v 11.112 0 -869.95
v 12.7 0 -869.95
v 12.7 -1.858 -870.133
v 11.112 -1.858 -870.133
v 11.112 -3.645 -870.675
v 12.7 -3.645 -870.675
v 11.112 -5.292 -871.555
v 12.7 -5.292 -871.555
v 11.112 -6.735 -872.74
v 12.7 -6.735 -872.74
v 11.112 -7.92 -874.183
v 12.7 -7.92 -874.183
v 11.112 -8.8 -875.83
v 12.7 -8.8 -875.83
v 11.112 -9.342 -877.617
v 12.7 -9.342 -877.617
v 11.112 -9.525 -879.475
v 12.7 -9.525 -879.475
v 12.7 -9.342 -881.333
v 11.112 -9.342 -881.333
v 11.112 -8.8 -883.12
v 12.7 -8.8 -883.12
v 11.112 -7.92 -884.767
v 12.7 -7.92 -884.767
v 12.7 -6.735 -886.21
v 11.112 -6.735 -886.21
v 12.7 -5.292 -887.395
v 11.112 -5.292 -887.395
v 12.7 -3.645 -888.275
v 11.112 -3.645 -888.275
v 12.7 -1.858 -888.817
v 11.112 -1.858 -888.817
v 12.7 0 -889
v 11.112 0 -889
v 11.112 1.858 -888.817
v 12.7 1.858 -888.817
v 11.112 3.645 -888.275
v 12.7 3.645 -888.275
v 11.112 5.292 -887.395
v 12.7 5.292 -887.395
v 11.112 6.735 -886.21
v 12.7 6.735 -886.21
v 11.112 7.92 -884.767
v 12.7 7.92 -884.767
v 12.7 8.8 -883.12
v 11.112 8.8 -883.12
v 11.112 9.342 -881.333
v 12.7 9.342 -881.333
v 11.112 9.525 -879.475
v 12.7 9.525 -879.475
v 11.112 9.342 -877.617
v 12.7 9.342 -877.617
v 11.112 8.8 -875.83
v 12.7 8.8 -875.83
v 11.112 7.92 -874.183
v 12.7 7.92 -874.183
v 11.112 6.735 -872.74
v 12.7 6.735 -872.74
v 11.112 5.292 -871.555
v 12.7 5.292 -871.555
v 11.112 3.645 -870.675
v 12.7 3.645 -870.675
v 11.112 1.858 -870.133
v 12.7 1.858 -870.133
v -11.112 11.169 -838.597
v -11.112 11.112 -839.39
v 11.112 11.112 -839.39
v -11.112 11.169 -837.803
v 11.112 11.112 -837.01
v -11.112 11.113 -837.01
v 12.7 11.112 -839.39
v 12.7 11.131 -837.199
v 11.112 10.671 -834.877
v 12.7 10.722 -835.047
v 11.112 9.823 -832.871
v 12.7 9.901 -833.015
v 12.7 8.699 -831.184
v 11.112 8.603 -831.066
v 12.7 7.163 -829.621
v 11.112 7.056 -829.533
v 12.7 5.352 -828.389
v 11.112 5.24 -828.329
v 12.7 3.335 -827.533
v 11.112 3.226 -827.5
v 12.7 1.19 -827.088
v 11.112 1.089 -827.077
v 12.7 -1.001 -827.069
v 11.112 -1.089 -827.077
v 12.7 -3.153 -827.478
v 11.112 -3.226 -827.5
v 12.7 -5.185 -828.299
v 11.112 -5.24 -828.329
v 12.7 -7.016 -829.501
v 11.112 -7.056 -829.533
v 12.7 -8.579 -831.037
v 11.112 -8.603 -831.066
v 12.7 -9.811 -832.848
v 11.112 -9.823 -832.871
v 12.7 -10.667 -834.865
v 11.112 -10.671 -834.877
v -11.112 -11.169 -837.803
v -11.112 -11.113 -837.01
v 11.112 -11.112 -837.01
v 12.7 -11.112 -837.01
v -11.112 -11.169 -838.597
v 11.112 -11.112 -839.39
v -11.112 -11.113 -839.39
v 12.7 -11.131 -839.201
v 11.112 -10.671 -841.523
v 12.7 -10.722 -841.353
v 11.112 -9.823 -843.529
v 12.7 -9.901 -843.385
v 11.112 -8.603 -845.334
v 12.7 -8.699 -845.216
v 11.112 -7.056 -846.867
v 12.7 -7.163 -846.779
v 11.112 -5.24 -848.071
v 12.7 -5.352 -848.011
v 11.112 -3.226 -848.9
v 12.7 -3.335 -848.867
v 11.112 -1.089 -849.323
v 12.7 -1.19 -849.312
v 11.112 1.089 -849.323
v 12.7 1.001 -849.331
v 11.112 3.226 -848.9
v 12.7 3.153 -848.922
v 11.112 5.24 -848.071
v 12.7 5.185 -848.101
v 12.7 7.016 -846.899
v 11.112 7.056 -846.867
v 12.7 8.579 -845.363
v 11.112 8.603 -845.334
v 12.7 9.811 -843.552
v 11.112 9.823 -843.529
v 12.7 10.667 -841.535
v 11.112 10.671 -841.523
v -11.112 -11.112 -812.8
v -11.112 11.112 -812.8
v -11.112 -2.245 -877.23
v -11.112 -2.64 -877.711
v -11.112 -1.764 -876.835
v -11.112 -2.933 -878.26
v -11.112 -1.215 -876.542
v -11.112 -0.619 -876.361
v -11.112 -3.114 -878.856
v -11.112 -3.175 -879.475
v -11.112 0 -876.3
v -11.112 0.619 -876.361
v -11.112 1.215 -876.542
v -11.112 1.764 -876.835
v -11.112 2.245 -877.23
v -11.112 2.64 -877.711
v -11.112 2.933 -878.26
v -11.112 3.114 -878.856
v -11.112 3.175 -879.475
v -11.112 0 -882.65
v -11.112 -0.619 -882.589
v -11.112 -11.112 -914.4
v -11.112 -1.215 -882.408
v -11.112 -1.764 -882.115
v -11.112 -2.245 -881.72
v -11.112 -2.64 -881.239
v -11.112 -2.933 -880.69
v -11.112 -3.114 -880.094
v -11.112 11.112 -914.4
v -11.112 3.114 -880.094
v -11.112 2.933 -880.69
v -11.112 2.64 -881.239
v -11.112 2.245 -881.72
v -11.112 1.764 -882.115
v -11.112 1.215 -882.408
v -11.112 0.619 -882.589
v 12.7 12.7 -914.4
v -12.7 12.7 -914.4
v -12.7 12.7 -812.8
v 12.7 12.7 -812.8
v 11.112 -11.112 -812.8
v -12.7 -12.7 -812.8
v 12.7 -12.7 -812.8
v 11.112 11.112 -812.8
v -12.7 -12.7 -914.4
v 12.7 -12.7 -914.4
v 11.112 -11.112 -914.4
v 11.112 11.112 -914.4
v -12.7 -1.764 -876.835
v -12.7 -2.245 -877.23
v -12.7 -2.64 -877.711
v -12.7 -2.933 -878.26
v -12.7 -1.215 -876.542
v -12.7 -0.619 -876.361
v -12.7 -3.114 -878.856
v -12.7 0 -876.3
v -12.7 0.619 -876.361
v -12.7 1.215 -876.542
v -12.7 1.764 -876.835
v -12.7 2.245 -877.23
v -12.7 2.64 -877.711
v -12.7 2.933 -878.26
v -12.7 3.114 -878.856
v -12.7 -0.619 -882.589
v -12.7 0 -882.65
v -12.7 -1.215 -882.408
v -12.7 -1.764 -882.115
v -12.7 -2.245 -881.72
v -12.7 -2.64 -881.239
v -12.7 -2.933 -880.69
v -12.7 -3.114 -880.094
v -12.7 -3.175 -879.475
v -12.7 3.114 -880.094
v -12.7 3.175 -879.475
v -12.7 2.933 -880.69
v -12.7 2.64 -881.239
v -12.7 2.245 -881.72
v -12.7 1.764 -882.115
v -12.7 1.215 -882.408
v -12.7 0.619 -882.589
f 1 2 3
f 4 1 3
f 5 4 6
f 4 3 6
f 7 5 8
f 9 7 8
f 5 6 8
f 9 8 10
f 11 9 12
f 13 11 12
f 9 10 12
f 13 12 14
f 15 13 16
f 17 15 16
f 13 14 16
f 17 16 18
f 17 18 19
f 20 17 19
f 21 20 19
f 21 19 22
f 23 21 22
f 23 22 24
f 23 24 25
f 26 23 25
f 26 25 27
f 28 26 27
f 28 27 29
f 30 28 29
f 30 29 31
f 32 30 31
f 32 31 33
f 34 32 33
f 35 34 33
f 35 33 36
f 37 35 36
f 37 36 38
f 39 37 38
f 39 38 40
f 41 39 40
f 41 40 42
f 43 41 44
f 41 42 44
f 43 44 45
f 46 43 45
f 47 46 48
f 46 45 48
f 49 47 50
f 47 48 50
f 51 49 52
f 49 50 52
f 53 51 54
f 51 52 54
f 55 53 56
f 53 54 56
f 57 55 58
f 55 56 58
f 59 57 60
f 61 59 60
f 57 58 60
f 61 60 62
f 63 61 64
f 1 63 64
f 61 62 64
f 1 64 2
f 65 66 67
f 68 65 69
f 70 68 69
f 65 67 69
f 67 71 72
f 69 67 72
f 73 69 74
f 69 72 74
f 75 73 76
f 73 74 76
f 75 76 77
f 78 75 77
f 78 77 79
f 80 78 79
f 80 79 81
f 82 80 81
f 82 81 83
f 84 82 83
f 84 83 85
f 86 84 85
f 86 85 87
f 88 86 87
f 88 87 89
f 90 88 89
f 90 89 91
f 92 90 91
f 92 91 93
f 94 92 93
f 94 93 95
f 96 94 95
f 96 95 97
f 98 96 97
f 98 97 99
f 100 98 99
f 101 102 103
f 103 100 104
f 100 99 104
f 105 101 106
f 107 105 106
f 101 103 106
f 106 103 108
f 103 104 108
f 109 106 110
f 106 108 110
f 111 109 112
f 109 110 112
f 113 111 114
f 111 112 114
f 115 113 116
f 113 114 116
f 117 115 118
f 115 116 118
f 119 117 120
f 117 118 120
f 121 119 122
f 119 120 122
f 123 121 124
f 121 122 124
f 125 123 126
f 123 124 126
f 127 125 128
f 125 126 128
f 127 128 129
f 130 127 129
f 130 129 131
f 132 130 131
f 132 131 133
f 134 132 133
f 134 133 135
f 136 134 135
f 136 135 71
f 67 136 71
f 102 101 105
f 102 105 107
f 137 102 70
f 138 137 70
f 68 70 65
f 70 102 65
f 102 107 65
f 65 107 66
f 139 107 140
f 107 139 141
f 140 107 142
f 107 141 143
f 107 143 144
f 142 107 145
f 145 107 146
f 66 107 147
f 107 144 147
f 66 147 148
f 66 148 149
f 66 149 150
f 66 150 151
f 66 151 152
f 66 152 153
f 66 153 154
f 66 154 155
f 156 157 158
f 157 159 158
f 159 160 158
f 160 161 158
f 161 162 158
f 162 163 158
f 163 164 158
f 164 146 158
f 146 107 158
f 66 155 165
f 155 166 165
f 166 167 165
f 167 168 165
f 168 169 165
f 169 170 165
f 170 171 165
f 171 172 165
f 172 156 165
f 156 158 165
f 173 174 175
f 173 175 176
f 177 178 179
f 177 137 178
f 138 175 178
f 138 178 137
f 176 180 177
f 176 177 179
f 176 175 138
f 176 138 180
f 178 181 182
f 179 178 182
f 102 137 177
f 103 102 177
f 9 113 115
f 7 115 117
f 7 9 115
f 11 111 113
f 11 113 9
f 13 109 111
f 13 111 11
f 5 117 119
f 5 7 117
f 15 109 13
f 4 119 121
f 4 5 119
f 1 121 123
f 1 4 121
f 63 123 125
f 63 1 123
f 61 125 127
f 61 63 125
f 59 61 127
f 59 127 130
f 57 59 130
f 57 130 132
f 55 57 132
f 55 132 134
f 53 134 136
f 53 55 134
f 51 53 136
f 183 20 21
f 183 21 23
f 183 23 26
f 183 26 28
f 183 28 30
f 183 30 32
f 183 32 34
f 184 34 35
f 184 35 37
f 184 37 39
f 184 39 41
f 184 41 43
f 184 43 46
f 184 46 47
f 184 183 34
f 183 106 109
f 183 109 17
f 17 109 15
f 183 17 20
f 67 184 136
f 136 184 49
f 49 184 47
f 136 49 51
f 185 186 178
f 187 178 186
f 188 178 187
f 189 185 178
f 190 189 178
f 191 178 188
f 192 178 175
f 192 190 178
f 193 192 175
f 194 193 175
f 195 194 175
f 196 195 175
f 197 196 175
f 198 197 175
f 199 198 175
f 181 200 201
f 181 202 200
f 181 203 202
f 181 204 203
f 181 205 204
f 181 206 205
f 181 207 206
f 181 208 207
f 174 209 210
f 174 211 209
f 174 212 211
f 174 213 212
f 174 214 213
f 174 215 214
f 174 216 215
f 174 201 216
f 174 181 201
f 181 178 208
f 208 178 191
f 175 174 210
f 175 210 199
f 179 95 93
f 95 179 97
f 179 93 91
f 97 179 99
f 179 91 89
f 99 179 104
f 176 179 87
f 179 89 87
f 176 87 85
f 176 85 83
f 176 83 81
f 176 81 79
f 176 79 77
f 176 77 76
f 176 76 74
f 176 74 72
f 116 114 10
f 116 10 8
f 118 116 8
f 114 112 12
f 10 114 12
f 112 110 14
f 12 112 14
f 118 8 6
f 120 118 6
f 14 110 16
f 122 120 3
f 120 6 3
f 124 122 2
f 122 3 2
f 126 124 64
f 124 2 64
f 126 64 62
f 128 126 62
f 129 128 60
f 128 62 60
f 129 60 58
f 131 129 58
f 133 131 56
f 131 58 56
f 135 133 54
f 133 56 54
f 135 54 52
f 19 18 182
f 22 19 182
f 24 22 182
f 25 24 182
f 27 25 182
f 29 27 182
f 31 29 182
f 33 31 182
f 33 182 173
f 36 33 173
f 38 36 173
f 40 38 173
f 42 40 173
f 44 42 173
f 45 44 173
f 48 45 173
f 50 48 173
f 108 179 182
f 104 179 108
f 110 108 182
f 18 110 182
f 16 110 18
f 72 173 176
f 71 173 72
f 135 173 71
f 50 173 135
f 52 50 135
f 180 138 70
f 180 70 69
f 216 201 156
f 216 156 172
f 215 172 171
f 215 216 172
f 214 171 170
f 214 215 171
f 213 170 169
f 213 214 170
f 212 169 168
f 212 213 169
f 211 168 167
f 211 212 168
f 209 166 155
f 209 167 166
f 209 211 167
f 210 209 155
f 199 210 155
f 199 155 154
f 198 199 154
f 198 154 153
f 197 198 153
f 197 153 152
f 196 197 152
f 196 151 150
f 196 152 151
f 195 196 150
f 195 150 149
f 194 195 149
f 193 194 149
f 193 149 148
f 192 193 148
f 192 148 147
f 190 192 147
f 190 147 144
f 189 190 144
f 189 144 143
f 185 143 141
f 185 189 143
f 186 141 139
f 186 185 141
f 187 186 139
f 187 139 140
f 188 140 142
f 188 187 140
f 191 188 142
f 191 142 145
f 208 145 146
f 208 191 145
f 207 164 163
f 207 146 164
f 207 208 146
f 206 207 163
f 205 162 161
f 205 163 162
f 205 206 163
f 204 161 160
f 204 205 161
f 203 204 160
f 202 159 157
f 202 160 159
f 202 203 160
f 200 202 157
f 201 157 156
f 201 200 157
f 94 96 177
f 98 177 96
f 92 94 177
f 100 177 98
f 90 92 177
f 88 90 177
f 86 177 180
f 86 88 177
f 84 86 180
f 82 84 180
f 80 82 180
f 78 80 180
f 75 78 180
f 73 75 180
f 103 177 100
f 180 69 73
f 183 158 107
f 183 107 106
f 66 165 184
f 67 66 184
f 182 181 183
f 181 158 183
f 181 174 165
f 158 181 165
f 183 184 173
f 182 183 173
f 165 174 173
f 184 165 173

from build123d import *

# Parameters (mm, degrees)
BOSS_EXTRUDE1_DEPTH            = 914.4
BOSS_EXTRUDE1_DEPTH_BACK       = 914.4
SKETCH3_W                      = 25.4
SKETCH3_H                      = 25.4
SKETCH3_W_2                    = 22.225
SKETCH3_H_2                    = 22.225
SKETCH5_W                      = 58.75494954
SKETCH5_H                      = 44.648037504
CUT_EXTRUDE1_DEPTH             = 1727.2
CUT_EXTRUDE2_REACH             = 916.841
SKETCH6_R                      = 9.525
SKETCH6_R_2                    = 11.176
CUT_EXTRUDE2_DIRECTION_2_DEPTH = 915.840865943
CUT_EXTRUDE3_DEPTH             = 915.798166349
CUT_EXTRUDE3_DEPTH_BACK        = 915.798166349
SKETCH9_R                      = 3.175


with BuildPart() as part:
    # Sketch3 → Boss-Extrude1 (new, two sides: drawn at the far end of the back side and taken through both)
    with BuildSketch(Plane.XY.offset(-BOSS_EXTRUDE1_DEPTH_BACK)):
        Rectangle(SKETCH3_W, SKETCH3_H)
        Rectangle(SKETCH3_W_2, SKETCH3_H_2, mode=Mode.SUBTRACT)
    extrude(amount=BOSS_EXTRUDE1_DEPTH + BOSS_EXTRUDE1_DEPTH_BACK)

    # Sketch5 → Cut-Extrude1 (cut)
    with BuildSketch(Plane.XY.offset(914.4)):
        Rectangle(SKETCH5_W, SKETCH5_H)
    extrude(amount=-CUT_EXTRUDE1_DEPTH, mode=Mode.SUBTRACT)

    # Cut-Extrude2: up to this face of the body (flat: up to its plane)
    cut_extrude2_end = Plane(part.part.faces().sort_by_distance((-11.1125, 0, -863.6))[0])
    # Sketch6 → Cut-Extrude2 (cut, up to the picked face)
    with BuildSketch(Plane(origin=(12.7, 0, 0), x_dir=(0, 0, -1), z_dir=(1, 0, 0)), mode=Mode.PRIVATE) as cut_extrude2_sk1:
        with Locations(Location((879.475, 0, 0), (0, 0, 180))):
            Circle(SKETCH6_R)
    cut_extrude2_tool1 = split(extrude(cut_extrude2_sk1.sketch, amount=-CUT_EXTRUDE2_REACH, mode=Mode.PRIVATE), bisect_by=cut_extrude2_end, keep=Keep.BOTH, mode=Mode.PRIVATE)
    # Sketch6 → Cut-Extrude2 (cut, up to the picked face)
    with BuildSketch(Plane(origin=(12.7, 0, 0), x_dir=(0, 0, -1), z_dir=(1, 0, 0)), mode=Mode.PRIVATE) as cut_extrude2_sk2:
        with Locations(Location((838.2, 0, 0), (0, 0, 83.889353751))):
            Circle(SKETCH6_R_2)
    cut_extrude2_tool2 = split(extrude(cut_extrude2_sk2.sketch, amount=-CUT_EXTRUDE2_REACH, mode=Mode.PRIVATE), bisect_by=cut_extrude2_end, keep=Keep.BOTH, mode=Mode.PRIVATE)
    add(cut_extrude2_tool1.solids().sort_by(Axis((12.7, 0, -879.475), (-1, 0, 0)))[0], mode=Mode.SUBTRACT)
    add(cut_extrude2_tool2.solids().sort_by(Axis((12.7, 0, -838.2), (-1, 0, 0)))[0], mode=Mode.SUBTRACT)

    # Sketch6 → Cut-Extrude2 direction 2 (cut)
    with BuildSketch(Plane(origin=(12.7, 0, 0), x_dir=(0, 0, -1), z_dir=(1, 0, 0))):
        with Locations(Location((879.475, 0, 0), (0, 0, 180))):
            Circle(SKETCH6_R)
        with Locations(Location((838.2, 0, 0), (0, 0, 83.889353751))):
            Circle(SKETCH6_R_2)
    extrude(amount=CUT_EXTRUDE2_DIRECTION_2_DEPTH, mode=Mode.SUBTRACT)

    # Sketch9 → Cut-Extrude3 (cut, two sides: drawn at the far end of the back side and taken through both)
    with BuildSketch(Plane(origin=(-11.1125, 0, 0), x_dir=(0, 0, -1), z_dir=(1, 0, 0)).offset(-CUT_EXTRUDE3_DEPTH_BACK)):
        with Locations((879.475, 0)):
            Circle(SKETCH9_R)
    extrude(amount=CUT_EXTRUDE3_DEPTH + CUT_EXTRUDE3_DEPTH_BACK, mode=Mode.SUBTRACT)


solid = part.part
